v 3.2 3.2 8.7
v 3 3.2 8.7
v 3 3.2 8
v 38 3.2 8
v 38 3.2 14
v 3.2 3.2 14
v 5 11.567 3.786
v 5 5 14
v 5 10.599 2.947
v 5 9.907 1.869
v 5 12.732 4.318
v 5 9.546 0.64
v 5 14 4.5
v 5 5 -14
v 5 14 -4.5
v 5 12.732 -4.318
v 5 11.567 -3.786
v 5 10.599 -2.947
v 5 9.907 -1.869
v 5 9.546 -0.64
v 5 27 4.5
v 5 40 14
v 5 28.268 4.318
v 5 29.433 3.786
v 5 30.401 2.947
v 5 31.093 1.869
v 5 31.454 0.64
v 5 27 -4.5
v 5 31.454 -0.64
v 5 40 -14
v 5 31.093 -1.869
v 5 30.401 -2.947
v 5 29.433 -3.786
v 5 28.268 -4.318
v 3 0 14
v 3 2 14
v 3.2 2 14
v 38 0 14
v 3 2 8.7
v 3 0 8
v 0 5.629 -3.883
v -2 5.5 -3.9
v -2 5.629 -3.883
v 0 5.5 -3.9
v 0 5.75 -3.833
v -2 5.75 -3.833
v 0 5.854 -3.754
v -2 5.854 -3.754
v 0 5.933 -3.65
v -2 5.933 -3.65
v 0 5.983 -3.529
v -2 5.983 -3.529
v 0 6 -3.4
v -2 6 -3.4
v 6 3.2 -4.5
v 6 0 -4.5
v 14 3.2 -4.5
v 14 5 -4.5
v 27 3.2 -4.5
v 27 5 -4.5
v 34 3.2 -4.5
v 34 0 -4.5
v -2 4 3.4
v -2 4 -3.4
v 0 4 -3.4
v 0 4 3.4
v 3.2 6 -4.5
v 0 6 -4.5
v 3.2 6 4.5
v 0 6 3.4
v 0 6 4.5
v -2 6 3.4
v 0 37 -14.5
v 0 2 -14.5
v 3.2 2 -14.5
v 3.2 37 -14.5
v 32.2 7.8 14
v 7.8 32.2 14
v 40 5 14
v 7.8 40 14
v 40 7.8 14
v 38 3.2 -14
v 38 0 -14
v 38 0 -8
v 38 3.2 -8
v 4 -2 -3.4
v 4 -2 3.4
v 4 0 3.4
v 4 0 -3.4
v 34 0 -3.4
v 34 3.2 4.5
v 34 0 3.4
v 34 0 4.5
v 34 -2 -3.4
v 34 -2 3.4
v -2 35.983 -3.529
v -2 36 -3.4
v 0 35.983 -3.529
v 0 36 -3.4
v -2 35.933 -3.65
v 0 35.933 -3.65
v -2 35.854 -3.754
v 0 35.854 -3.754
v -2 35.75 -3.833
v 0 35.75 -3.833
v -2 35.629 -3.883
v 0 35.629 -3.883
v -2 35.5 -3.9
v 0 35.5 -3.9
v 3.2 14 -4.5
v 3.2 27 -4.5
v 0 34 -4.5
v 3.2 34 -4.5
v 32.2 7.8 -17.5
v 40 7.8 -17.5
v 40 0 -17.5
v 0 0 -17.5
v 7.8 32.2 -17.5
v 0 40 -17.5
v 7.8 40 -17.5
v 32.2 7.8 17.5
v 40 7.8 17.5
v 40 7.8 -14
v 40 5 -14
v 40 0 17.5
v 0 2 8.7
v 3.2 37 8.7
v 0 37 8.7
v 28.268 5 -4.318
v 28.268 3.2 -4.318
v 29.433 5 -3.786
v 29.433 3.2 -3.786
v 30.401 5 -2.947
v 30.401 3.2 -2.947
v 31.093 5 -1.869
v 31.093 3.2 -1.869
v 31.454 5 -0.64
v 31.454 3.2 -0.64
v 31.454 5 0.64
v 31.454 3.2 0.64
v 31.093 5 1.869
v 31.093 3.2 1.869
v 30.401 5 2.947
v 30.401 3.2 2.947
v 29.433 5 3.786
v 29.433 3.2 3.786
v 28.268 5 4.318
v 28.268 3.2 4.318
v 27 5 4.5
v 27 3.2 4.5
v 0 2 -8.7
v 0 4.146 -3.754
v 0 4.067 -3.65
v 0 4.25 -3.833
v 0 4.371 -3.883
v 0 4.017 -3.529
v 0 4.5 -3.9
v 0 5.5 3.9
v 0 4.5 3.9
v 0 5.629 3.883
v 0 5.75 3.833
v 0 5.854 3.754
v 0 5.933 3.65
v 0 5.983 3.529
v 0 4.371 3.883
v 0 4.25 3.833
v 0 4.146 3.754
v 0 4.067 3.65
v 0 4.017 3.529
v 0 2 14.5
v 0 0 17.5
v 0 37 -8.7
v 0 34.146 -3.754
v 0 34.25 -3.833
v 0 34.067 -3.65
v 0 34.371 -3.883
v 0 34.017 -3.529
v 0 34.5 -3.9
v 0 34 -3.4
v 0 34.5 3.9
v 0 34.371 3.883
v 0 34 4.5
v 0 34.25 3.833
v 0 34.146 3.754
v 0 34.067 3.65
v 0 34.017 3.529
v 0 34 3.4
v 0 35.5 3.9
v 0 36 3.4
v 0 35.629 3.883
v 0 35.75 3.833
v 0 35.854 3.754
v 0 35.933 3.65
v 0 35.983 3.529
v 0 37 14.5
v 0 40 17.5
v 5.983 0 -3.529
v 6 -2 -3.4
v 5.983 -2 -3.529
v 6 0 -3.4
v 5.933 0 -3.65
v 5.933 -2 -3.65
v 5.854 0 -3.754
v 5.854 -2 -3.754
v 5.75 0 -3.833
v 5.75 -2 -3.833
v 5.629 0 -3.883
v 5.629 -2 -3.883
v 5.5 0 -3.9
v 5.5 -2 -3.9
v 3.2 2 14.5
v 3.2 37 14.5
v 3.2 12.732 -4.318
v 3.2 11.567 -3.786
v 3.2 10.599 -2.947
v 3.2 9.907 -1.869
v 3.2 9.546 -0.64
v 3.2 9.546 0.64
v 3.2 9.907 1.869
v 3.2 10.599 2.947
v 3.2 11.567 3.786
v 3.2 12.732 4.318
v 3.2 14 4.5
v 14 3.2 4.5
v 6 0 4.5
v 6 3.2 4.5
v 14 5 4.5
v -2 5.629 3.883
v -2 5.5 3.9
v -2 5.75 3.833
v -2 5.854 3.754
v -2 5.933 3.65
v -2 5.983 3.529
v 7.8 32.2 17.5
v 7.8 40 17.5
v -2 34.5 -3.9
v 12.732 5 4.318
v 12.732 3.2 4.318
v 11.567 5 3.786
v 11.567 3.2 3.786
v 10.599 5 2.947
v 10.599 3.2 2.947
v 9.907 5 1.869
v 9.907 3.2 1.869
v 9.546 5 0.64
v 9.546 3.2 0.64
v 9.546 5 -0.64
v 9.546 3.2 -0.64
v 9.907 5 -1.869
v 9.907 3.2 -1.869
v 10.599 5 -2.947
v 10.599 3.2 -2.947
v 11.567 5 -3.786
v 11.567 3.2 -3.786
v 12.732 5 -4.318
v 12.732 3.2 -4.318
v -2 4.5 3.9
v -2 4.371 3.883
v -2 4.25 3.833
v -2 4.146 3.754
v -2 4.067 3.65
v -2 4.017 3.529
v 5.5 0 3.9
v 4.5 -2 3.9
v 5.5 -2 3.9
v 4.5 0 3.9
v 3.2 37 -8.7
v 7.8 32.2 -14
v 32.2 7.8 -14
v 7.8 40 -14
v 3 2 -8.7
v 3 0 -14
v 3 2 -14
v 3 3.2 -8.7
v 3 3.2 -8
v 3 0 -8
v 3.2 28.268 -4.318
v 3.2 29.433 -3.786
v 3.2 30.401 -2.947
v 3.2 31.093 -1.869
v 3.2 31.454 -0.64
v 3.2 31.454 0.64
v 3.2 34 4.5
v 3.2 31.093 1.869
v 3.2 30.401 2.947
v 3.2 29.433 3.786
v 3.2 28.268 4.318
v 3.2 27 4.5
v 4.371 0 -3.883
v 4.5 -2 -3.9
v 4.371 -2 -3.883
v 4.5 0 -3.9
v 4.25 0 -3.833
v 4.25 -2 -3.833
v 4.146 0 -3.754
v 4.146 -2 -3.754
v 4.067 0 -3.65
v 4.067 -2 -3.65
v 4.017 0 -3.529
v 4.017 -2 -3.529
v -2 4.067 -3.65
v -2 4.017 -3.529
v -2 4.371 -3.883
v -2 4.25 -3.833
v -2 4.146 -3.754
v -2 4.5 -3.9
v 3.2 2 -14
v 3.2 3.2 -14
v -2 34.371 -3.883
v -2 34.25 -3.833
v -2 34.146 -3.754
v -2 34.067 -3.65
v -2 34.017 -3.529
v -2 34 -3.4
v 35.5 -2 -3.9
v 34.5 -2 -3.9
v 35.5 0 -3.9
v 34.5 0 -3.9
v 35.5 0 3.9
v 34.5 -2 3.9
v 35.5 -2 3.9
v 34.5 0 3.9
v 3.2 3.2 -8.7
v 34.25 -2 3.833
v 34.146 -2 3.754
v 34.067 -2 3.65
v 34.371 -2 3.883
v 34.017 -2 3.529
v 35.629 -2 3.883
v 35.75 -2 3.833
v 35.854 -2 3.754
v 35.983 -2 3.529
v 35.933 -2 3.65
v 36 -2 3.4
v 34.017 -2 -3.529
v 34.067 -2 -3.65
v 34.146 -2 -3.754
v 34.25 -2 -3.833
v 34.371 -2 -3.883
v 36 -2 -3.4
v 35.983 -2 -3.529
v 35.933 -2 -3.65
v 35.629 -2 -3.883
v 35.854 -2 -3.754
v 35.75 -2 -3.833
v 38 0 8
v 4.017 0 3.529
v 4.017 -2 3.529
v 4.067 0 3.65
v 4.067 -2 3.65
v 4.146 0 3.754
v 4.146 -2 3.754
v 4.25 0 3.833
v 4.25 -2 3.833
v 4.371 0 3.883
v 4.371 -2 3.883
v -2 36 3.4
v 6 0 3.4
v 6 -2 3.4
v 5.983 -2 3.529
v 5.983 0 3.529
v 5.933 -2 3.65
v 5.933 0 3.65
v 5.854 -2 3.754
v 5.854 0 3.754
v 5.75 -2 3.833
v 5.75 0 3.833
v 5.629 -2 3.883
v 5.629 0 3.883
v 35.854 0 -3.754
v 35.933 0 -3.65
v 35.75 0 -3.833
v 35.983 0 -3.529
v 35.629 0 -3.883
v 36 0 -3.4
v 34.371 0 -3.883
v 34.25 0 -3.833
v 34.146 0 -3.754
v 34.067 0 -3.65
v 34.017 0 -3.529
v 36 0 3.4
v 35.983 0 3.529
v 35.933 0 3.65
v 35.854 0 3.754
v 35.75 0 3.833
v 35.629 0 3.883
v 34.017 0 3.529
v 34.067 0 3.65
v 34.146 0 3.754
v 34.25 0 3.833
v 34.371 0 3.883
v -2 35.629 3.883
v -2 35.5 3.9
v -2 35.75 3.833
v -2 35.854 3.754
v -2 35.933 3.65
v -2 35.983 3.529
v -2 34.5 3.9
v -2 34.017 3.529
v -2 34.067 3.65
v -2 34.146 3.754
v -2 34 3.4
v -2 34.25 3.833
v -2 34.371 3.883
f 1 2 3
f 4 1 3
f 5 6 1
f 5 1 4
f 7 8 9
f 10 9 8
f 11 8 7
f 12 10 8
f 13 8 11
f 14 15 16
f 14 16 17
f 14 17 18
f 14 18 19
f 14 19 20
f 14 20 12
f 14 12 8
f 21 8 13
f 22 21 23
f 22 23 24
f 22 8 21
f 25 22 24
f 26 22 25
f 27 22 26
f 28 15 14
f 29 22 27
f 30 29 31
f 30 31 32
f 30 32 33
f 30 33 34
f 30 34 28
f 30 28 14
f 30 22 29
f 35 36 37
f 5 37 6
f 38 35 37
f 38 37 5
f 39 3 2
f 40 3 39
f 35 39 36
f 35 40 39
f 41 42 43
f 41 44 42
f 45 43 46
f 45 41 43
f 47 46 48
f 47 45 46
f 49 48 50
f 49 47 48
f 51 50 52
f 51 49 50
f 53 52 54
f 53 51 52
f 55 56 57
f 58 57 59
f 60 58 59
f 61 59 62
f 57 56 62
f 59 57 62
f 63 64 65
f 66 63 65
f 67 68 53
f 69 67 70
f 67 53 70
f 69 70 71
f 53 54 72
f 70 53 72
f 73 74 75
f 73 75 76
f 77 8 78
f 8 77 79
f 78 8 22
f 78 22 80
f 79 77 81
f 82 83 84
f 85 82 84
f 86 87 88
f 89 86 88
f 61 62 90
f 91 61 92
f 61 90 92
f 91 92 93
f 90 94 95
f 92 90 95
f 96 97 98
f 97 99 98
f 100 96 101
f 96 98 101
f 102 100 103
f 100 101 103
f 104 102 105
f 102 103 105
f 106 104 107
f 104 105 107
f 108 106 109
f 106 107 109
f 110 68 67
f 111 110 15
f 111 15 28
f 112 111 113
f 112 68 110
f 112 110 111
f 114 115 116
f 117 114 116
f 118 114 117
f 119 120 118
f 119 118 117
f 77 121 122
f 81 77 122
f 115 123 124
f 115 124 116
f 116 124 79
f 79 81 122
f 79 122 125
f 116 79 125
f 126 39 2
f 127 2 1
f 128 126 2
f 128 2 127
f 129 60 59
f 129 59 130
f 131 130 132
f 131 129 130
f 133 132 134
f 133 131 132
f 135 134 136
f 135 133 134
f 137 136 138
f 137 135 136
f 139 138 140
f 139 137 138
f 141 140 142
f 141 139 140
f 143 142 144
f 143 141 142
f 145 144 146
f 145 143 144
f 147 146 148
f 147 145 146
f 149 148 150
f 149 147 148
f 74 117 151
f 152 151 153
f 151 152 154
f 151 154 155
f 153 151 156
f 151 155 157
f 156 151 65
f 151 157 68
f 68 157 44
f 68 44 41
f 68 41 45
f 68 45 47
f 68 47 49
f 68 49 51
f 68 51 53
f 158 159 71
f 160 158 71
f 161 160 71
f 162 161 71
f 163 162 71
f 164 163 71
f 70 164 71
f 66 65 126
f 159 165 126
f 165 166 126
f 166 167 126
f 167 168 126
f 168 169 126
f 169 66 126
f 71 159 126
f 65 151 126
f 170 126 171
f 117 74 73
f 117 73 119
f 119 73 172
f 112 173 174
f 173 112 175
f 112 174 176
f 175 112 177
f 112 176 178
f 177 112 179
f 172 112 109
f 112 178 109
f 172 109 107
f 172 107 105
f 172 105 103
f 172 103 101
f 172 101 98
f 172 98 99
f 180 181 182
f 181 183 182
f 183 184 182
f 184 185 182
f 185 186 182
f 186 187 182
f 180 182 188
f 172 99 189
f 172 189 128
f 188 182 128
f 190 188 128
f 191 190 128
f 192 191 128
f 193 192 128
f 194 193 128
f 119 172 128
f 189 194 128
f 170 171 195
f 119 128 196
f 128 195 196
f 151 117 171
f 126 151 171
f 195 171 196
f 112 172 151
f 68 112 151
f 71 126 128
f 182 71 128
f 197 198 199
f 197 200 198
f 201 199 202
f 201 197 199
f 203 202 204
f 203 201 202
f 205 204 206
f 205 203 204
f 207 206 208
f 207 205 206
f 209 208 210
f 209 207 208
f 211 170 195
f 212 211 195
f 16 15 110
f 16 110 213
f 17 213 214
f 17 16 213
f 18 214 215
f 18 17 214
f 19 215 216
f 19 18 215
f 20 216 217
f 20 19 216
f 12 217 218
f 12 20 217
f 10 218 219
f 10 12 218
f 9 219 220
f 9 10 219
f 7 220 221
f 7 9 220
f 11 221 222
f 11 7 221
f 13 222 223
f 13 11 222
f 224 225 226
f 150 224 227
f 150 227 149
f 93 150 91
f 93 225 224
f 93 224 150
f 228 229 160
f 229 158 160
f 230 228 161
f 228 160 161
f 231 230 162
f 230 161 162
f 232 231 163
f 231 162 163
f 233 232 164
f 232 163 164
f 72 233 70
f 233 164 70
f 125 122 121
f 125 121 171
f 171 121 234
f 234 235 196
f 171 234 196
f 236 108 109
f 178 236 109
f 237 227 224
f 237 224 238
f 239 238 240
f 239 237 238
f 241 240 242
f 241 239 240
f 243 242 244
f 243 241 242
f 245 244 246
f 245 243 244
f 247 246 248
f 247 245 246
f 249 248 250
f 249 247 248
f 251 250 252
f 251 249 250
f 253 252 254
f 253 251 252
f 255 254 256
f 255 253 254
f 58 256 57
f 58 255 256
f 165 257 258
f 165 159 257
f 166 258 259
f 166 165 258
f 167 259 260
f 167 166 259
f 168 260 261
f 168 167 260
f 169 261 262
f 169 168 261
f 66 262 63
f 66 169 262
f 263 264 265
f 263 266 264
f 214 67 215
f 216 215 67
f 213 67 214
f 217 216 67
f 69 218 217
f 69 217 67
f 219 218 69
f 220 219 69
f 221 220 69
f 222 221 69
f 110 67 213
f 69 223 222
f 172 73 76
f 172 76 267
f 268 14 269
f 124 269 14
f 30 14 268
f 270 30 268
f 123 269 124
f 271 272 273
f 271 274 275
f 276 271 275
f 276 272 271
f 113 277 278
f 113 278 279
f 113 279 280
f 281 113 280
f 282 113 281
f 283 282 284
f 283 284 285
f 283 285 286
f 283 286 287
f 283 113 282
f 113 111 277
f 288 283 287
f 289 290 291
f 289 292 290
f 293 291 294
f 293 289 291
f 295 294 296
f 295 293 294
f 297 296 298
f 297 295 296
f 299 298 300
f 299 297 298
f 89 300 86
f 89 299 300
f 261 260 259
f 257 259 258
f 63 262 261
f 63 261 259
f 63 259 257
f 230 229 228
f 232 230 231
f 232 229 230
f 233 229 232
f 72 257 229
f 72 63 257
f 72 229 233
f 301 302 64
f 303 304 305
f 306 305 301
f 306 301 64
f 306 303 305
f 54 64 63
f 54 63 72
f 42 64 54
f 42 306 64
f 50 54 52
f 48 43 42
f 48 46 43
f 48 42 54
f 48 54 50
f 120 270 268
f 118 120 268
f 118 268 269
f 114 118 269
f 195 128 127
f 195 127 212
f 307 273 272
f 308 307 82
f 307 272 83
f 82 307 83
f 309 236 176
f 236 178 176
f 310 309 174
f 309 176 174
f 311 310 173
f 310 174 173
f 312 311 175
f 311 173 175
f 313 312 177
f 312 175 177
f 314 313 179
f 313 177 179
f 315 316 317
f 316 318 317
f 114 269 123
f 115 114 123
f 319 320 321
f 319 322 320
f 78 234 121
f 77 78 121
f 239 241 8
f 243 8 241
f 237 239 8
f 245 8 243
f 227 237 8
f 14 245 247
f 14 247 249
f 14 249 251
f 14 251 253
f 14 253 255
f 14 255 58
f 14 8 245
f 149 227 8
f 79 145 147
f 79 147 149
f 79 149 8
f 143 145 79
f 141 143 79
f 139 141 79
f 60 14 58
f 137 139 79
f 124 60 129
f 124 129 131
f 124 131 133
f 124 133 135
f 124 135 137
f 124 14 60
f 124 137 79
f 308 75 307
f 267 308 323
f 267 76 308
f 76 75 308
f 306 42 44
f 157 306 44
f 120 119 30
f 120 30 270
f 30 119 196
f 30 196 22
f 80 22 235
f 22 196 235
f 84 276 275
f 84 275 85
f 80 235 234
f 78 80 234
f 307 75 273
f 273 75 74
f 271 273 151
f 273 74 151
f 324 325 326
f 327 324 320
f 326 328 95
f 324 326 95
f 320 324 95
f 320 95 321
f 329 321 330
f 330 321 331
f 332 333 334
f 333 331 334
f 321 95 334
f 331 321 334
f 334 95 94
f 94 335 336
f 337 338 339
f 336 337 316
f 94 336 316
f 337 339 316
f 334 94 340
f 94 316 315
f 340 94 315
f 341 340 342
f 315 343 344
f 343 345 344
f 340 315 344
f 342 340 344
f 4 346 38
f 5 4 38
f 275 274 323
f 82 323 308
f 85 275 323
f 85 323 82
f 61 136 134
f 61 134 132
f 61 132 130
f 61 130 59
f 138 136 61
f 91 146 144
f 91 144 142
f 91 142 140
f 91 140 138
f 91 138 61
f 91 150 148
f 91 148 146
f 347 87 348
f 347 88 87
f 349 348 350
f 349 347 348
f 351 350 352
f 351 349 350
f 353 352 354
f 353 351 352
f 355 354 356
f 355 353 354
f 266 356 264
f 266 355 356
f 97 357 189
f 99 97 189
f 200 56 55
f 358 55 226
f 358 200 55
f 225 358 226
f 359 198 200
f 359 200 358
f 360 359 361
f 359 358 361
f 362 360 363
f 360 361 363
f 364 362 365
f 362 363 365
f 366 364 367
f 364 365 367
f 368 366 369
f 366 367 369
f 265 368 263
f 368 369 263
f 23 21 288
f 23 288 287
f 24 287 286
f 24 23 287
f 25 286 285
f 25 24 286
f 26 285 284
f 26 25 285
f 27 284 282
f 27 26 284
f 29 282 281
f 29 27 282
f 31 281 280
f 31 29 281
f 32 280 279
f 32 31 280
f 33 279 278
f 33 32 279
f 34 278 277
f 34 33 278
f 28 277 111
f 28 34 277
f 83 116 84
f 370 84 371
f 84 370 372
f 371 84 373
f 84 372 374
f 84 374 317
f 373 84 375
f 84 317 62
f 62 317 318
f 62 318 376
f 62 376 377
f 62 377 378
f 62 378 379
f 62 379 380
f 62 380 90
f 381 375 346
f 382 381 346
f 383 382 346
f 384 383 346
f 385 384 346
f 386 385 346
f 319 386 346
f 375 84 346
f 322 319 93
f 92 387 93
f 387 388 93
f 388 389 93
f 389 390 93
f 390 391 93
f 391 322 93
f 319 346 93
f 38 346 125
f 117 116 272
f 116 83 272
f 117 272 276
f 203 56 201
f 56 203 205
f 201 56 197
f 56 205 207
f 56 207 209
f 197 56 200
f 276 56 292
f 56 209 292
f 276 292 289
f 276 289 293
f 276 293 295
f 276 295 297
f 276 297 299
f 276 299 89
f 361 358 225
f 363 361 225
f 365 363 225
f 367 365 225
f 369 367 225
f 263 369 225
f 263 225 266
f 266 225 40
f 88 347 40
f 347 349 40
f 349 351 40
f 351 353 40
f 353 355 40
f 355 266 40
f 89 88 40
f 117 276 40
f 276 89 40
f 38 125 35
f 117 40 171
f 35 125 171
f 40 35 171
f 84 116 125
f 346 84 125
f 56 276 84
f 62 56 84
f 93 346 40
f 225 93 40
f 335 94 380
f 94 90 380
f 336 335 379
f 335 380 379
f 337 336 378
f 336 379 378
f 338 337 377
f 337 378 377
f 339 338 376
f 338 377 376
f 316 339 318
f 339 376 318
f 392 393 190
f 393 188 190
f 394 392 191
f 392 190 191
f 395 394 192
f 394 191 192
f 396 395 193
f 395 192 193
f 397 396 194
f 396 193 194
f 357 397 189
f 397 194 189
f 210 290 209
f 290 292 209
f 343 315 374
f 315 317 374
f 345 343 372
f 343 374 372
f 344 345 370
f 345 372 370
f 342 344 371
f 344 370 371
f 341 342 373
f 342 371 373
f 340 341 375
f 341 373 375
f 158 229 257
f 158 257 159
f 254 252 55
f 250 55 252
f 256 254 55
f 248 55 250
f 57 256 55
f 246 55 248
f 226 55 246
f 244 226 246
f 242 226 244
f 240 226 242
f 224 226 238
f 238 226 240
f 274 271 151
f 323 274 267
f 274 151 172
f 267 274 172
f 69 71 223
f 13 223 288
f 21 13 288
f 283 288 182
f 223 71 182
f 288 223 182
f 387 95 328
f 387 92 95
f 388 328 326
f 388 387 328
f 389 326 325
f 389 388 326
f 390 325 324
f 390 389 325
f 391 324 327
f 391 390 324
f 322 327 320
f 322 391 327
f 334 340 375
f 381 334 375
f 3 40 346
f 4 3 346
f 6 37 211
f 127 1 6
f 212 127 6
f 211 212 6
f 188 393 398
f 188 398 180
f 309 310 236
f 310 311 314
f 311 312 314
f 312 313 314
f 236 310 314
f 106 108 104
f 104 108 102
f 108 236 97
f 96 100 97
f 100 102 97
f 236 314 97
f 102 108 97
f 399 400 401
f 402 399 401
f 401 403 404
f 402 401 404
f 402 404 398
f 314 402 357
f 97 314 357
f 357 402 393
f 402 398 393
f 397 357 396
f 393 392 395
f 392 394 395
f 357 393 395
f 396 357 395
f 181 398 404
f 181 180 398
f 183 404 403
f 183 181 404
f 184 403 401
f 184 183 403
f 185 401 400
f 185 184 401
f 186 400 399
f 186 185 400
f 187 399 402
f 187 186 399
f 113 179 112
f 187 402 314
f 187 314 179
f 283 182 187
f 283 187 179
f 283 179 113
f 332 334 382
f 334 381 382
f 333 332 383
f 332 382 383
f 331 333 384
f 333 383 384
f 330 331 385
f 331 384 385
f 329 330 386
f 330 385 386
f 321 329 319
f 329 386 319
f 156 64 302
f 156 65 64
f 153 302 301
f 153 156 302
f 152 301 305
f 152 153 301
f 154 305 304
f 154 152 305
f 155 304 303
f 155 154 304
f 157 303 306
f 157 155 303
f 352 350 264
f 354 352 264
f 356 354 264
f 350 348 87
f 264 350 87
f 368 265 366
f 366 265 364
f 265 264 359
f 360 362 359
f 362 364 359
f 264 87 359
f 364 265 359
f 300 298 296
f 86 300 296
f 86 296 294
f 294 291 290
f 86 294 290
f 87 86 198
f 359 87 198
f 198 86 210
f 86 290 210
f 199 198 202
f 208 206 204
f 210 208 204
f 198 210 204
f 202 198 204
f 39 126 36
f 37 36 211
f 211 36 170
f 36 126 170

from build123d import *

# Parameters (mm, degrees)
EXTRUDE_1_DEPTH      = 17.5
EXTRUDE_1_DEPTH_BACK = 17.5
SKETCH_2_W           = 35
SKETCH_2_H           = 28
CUT_EXTRUDE_1_DEPTH  = 35
CUT_EXTRUDE_2_DEPTH  = 6
CUT_EXTRUDE_3_DEPTH  = 6
SKETCH_5_W           = 9
SKETCH_5_H           = 28
SKETCH_5_W_2         = 5.8
SKETCH_5_H_2         = 35
CUT_EXTRUDE_4_DEPTH  = 3.2
SKETCH_6_W           = 28
SKETCH_6_H           = 9
SKETCH_6_W_2         = 35
SKETCH_6_H_2         = 6
CUT_EXTRUDE_5_DEPTH  = 3.2
SKETCH_8_W           = 2
SKETCH_8_H           = 2
EXTRUDE_2_DEPTH      = 3.9
EXTRUDE_2_DEPTH_BACK = 3.9
FILLET_2_R           = 0.5


with BuildPart() as part:
    # Sketch 1 → Extrude 1 (new body, two sides)
    with BuildSketch(Plane.XY) as extrude_1_sk:
        Polygon((0, 0), (0, 40), (7.8, 40), (7.8, 32.2), (32.2, 7.8), (40, 7.8), (40, 0), align=None)
    extrude(amount=EXTRUDE_1_DEPTH)
    extrude(extrude_1_sk.sketch, amount=-EXTRUDE_1_DEPTH_BACK)

    # Sketch 2 → Cut-Extrude 1 (cut)
    with BuildSketch(Plane(origin=(0, 40, 0), x_dir=(1, 0, 0), z_dir=(0, 1, 0))):
        with Locations((22.5, 0)):
            Rectangle(SKETCH_2_W, SKETCH_2_H)
    extrude(amount=-CUT_EXTRUDE_1_DEPTH, mode=Mode.SUBTRACT)

    # Sketch 3 → Cut-Extrude 2 (cut, through all)
    with BuildSketch(Plane(origin=(0, 5, 0), x_dir=(1, 0, 0), z_dir=(0, 1, 0))):
        with BuildLine():
            Line((14, 4.5), (27, 4.5))
            ThreePointArc((27, 4.5), (31.5, 0), (27, -4.5))
            Line((27, -4.5), (14, -4.5))
            ThreePointArc((14, -4.5), (9.5, 0), (14, 4.5))
        make_face()
    extrude(amount=-CUT_EXTRUDE_2_DEPTH, mode=Mode.SUBTRACT)

    # Sketch 4 → Cut-Extrude 3 (cut, through all)
    with BuildSketch(Plane(origin=(5, 0, 0), x_dir=(0, 0, -1), z_dir=(1, 0, 0))):
        with BuildLine():
            Line((4.5, 27), (4.5, 14))
            ThreePointArc((4.5, 14), (0, 9.5), (-4.5, 14))
            Line((-4.5, 14), (-4.5, 27))
            ThreePointArc((-4.5, 27), (0, 31.5), (4.5, 27))
        make_face()
    extrude(amount=-CUT_EXTRUDE_3_DEPTH, mode=Mode.SUBTRACT)

    # Sketch 5 → Cut-Extrude 4 (cut)
    with BuildSketch(Plane.ZY):
        with Locations((0, 20)):
            Rectangle(SKETCH_5_W, SKETCH_5_H)
        with Locations((-11.6, 19.5)):
            Rectangle(SKETCH_5_W_2, SKETCH_5_H_2)
        with Locations((11.6, 19.5)):
            Rectangle(SKETCH_5_W_2, SKETCH_5_H_2)
    extrude(amount=-CUT_EXTRUDE_4_DEPTH, mode=Mode.SUBTRACT)

    # Sketch 6 → Cut-Extrude 5 (cut)
    with BuildSketch(Plane.XZ):
        with Locations((20, 0)):
            Rectangle(SKETCH_6_W, SKETCH_6_H)
        with Locations((20.5, 11)):
            Rectangle(SKETCH_6_W_2, SKETCH_6_H_2)
        with Locations((20.5, -11)):
            Rectangle(SKETCH_6_W_2, SKETCH_6_H_2)
    extrude(amount=-CUT_EXTRUDE_5_DEPTH, mode=Mode.SUBTRACT)

    # Sketch 8 → Extrude 2 (add, two sides)
    with BuildSketch(Plane.XY) as extrude_2_sk:
        with Locations((-1, 35)):
            Rectangle(SKETCH_8_W, SKETCH_8_H)
        with Locations((-1, 5)):
            Rectangle(SKETCH_8_W, SKETCH_8_H)
        with Locations((5, -1)):
            Rectangle(SKETCH_8_W, SKETCH_8_H)
        with Locations((35, -1)):
            Rectangle(SKETCH_8_W, SKETCH_8_H)
    extrude(amount=EXTRUDE_2_DEPTH)
    extrude(extrude_2_sk.sketch, amount=-EXTRUDE_2_DEPTH_BACK)

    # Fillet 2
    fillet_2_edges = [part.edges().sort_by_distance(p)[0] for p in [
        (-1, 34, -3.9),
        (-1, 36, -3.9),
        (-1, 36, 3.9),
        (-1, 34, 3.9),
        (-1, 6, -3.9),
        (-1, 4, -3.9),
        (-1, 6, 3.9),
        (-1, 4, 3.9),
        (6, -1, -3.9),
        (4, -1, -3.9),
        (4, -1, 3.9),
        (6, -1, 3.9),
        (36, -1, -3.9),
        (34, -1, -3.9),
        (34, -1, 3.9),
        (36, -1, 3.9),
    ]]
    fillet(fillet_2_edges, radius=FILLET_2_R)


solid = part.part
